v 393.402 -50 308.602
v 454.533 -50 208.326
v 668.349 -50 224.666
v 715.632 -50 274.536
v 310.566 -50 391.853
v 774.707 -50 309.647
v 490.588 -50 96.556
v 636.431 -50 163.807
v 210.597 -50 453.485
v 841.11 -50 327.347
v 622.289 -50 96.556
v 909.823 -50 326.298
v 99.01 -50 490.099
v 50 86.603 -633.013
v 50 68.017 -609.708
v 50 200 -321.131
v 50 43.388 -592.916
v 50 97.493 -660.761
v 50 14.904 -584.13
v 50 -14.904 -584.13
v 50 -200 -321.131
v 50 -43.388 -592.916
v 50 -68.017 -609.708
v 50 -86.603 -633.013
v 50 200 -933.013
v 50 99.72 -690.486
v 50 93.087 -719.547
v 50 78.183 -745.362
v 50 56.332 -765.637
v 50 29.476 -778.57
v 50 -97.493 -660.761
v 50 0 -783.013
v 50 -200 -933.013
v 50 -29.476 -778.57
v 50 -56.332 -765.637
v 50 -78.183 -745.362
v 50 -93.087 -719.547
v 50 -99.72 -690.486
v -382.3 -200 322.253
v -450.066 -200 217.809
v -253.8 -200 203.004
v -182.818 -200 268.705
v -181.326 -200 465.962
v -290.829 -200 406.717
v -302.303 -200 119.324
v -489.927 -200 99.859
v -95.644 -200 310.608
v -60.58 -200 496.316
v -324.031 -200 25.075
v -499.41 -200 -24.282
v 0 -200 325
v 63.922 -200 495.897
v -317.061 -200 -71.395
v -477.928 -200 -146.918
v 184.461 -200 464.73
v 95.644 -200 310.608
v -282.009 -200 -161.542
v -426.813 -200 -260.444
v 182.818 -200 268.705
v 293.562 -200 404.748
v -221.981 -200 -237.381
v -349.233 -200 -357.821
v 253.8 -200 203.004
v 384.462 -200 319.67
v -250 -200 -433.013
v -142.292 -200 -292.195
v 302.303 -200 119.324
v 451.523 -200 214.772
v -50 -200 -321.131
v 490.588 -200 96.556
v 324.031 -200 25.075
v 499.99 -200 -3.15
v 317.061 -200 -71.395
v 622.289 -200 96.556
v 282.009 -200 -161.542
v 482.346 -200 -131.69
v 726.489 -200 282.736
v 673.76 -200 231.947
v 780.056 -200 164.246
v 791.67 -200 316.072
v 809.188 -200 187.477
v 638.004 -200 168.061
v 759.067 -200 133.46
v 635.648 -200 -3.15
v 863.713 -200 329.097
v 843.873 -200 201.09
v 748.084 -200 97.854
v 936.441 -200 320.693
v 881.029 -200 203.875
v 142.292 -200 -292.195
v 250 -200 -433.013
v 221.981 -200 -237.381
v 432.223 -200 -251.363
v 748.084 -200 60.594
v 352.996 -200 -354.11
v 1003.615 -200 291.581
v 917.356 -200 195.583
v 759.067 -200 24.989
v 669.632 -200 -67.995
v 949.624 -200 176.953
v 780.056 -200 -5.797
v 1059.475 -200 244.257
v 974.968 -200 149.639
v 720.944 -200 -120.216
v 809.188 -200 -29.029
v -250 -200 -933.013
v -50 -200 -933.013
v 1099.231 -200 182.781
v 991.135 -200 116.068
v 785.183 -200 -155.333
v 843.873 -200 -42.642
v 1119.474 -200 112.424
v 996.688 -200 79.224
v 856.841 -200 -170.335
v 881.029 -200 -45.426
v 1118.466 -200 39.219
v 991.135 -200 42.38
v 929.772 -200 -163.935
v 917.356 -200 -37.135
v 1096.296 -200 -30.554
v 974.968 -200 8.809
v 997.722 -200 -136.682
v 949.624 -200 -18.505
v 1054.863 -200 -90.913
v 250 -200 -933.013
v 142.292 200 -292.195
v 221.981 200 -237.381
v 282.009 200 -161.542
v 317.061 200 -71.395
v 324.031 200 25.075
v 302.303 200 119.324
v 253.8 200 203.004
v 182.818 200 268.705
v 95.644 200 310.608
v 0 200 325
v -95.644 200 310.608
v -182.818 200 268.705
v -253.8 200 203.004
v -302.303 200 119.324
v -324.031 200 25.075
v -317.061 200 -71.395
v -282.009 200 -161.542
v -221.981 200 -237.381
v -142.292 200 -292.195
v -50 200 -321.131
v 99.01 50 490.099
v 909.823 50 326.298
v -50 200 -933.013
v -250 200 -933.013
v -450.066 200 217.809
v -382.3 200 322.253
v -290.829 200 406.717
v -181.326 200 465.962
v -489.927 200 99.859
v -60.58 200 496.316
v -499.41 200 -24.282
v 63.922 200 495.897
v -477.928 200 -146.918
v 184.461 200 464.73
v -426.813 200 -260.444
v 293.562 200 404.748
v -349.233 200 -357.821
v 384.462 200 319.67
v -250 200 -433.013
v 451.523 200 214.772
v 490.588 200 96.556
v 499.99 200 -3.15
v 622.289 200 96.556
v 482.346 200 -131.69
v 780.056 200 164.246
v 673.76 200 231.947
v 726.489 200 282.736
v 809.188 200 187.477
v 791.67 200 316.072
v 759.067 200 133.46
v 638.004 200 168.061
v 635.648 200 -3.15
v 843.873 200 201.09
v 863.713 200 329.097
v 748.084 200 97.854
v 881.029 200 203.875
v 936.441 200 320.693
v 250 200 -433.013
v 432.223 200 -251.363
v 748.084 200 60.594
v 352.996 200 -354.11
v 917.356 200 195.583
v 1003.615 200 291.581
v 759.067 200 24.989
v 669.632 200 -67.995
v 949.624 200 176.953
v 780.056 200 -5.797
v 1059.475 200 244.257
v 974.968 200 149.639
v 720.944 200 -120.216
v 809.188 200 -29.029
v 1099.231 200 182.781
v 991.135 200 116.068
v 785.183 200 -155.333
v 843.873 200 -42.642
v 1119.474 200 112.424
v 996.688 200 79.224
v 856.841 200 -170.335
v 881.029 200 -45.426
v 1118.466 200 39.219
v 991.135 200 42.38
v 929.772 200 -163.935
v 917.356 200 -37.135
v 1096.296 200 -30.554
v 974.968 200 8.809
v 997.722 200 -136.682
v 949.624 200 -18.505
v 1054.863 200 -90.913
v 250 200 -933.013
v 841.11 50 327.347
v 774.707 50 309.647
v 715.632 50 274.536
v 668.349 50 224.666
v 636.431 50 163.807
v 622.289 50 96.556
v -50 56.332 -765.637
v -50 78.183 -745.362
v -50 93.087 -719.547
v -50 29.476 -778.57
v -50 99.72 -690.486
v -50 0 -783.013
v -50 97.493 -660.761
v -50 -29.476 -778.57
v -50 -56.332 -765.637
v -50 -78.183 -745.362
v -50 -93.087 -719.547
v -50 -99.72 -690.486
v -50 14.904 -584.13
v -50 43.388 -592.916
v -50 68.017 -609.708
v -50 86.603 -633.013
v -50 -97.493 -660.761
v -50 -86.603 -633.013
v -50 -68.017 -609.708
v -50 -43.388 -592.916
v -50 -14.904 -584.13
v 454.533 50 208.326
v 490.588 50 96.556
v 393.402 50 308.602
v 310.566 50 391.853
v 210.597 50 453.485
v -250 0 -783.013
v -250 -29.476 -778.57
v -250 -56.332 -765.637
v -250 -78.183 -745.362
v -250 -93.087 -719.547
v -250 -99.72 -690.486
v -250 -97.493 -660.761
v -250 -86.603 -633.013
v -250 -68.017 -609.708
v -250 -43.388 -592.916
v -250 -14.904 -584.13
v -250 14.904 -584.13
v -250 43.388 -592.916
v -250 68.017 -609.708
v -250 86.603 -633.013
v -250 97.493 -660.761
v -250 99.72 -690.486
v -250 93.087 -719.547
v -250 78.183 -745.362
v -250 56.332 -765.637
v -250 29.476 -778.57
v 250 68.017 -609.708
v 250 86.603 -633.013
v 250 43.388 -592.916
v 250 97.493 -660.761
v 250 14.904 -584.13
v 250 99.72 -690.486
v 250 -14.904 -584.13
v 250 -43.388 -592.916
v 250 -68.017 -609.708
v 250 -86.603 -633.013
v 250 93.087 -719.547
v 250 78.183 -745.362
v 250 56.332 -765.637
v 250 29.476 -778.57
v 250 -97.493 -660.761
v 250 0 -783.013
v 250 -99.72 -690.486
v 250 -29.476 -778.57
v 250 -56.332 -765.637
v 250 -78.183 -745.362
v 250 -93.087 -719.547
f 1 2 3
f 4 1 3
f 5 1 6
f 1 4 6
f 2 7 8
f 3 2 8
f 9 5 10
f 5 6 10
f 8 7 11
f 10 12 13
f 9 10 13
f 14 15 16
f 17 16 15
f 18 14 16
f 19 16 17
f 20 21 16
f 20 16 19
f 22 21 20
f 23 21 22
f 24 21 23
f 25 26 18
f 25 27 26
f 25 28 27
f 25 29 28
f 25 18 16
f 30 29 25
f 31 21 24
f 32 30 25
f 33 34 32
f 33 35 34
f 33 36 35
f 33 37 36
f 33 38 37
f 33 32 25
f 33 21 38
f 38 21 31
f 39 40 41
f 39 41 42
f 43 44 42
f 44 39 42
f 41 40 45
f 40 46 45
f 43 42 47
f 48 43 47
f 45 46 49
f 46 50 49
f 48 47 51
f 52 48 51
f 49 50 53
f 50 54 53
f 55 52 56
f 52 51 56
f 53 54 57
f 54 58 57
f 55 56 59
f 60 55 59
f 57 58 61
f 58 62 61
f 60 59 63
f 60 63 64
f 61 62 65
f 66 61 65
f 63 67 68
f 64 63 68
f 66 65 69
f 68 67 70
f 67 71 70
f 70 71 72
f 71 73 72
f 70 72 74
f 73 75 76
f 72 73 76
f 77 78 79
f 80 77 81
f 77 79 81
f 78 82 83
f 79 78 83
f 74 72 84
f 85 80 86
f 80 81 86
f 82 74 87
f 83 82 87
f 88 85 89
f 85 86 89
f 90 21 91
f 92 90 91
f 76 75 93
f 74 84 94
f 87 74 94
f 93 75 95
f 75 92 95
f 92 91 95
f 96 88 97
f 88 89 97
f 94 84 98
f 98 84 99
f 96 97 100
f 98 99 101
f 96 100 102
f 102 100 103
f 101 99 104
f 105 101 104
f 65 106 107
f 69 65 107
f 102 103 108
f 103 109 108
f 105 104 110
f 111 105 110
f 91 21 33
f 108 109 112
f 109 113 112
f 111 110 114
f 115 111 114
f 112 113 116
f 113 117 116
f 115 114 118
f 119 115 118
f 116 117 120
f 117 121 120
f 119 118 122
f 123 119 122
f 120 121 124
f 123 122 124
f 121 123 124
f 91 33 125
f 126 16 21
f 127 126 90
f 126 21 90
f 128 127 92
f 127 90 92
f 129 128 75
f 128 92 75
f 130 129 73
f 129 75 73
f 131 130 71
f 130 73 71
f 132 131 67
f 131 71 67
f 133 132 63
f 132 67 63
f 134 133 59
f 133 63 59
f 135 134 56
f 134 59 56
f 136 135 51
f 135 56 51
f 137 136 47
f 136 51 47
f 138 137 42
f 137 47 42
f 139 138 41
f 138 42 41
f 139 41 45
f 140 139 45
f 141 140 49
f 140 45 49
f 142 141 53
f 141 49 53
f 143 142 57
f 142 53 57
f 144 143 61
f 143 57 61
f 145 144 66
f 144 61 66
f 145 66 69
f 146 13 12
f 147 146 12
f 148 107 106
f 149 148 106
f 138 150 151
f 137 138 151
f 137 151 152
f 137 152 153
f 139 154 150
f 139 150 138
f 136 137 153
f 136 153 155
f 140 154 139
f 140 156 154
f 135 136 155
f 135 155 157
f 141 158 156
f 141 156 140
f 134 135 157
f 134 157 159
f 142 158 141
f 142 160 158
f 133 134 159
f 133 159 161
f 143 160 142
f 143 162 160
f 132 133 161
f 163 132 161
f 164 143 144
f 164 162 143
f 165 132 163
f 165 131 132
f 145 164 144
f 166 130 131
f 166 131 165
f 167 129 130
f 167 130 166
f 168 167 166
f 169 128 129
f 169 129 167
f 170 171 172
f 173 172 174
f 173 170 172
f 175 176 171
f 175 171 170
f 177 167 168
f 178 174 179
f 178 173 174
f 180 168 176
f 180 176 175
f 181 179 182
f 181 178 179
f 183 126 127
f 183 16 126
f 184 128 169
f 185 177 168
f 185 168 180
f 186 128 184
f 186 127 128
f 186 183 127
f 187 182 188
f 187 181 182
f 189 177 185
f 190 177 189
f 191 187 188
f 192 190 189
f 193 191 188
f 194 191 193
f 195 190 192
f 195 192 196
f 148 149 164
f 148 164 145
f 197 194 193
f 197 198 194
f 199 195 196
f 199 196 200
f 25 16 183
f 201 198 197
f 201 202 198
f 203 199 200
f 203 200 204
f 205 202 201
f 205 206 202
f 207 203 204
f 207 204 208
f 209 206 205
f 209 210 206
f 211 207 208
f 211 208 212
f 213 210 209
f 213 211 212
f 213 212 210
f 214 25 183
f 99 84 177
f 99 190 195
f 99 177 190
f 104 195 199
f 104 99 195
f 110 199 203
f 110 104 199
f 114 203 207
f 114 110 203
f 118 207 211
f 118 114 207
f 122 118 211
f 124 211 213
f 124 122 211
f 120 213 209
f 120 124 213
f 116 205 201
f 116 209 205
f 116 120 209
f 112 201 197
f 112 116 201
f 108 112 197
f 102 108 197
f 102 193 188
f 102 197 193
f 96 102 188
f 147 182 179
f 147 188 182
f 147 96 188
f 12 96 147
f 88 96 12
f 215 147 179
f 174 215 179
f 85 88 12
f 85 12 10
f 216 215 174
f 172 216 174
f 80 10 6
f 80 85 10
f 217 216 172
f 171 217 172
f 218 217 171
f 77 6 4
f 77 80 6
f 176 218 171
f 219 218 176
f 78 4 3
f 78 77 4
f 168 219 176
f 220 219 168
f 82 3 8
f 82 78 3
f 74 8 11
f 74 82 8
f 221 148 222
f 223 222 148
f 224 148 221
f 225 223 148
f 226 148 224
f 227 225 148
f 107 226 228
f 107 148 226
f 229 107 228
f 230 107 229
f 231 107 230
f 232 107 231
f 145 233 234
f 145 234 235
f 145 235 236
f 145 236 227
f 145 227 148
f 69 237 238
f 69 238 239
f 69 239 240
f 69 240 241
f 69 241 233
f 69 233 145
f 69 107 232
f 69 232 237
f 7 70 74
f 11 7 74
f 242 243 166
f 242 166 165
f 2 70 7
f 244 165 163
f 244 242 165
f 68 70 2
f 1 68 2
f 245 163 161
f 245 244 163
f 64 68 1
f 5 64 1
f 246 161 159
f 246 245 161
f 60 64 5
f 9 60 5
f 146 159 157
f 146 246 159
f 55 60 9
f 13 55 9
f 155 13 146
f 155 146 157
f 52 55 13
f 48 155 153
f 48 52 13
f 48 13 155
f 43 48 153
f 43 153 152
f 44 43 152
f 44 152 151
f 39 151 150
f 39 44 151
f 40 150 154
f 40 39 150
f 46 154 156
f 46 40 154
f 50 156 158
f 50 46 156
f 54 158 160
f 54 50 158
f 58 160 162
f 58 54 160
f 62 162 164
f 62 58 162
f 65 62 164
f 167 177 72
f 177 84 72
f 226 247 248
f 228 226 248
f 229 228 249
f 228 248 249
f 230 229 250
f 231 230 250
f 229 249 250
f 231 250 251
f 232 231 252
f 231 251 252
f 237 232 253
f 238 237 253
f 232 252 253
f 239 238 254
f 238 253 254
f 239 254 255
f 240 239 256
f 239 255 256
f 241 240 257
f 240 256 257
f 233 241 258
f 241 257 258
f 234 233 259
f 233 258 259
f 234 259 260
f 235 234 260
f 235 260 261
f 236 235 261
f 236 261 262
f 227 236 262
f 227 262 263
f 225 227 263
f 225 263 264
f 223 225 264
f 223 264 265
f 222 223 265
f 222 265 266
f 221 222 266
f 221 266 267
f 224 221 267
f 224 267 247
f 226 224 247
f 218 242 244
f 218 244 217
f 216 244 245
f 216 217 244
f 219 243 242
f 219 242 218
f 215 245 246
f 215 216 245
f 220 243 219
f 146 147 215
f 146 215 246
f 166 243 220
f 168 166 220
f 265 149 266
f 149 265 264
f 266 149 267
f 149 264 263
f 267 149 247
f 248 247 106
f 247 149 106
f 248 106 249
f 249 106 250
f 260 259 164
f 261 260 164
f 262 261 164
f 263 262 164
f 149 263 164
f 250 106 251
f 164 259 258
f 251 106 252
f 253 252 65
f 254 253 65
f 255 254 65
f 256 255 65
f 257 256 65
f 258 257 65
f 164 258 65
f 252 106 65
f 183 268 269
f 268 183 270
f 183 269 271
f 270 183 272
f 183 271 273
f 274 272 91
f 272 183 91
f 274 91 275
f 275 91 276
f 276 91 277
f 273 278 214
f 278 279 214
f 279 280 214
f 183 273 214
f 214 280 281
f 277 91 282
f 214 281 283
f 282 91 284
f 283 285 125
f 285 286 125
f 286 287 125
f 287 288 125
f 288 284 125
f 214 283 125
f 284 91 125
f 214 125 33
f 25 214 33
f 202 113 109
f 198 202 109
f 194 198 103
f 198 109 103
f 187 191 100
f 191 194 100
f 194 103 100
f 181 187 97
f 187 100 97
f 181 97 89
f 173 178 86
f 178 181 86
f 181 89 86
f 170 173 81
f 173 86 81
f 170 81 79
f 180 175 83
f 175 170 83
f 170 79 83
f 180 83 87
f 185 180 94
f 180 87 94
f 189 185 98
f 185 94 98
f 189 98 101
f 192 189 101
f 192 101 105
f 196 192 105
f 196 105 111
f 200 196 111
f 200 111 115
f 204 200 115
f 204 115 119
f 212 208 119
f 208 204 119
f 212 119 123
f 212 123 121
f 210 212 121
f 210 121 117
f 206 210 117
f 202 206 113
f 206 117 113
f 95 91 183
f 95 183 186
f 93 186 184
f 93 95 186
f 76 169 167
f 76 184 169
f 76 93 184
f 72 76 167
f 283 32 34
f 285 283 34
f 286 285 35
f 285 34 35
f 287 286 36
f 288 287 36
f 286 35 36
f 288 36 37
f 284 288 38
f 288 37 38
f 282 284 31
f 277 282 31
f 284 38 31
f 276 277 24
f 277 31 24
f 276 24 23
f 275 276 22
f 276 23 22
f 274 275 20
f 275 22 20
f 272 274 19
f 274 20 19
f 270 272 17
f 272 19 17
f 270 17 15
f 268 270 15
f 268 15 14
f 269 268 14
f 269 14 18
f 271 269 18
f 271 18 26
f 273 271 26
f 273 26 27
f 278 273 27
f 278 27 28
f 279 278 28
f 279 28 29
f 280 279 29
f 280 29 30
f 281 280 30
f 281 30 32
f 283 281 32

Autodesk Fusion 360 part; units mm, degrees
sketch "Sketch1" plane through (0, 0, 0) normal (0, 1, 0) x (1, 0, 0)
  line L0 (0, 0) -> (0, -1175.3412)
  line L1 (0, -1175.3412) -> (0, 325) construction
  line L2 (0, 0) -> (-1356.5029, 0) construction
  circle A0 centre (871.6879, -79.2241) radius 125
  circle A1 centre (871.6879, -79.2241) radius 250
  line L3 (-50, 255) -> (50, 255)
  line L4 (50, 321.1308) -> (50, 933.0127)
  line L5 (-50, 945) -> (-50, 255)
  line L6 (250, 433.0127) -> (250, 933.0127)
  line L7 (-250, 933.0127) -> (-250, 433.0127)
  line L8 (635.6485, 3.1495) -> (499.9901, 3.1495)
  line L9 (490.5883, -96.5563) -> (622.2894, -96.5563)
  line L10 (-1356.5029, 0) -> (466.5356, 0) construction
  line L11 (634.5728, 0) -> (675.4964, 0) construction
  line L12 (775, 0) -> (1559.7574, 0) construction
  line L13 (250, 933.0127) -> (48.2627, 933.0127)
  line L14 (-48.2627, 933.0127) -> (-250, 933.0127)
  line L15 (-48.2627, 933.0127) -> (-50, 945) construction
  arc A2 (-250, 433.0127) -> (250, 433.0127) centre (0, 0) ccw
  arc A3 (-50, 321.1308) -> (50, 321.1308) centre (0, 0) ccw
  line L16 (99.0099, -490.099) -> (909.823, -326.2984)
  dimension "d1" = 650
  dimension "d2" = 1000
  dimension "d3" = 250
  dimension "d4" = 500
  dimension "d7" = 500
  dimension "d8" = 500
  dimension "d9" = 933.0127
extrude "Extrude1" add sketch "Sketch1" along normal mid plane 400 contours L0 L4 L6 L13 A2 A3 | L0 L5 L7 L14 A2 A3 | A1 L8 L9 A2 | A1
extrude "Extrude2" add sketch "Sketch1" along normal mid plane 100 contours A1 L9 A2 L16
hole "Hole1" at (250, -9.09, -683.0127) direction (-1, 0, 0) diameter 200 end through all
